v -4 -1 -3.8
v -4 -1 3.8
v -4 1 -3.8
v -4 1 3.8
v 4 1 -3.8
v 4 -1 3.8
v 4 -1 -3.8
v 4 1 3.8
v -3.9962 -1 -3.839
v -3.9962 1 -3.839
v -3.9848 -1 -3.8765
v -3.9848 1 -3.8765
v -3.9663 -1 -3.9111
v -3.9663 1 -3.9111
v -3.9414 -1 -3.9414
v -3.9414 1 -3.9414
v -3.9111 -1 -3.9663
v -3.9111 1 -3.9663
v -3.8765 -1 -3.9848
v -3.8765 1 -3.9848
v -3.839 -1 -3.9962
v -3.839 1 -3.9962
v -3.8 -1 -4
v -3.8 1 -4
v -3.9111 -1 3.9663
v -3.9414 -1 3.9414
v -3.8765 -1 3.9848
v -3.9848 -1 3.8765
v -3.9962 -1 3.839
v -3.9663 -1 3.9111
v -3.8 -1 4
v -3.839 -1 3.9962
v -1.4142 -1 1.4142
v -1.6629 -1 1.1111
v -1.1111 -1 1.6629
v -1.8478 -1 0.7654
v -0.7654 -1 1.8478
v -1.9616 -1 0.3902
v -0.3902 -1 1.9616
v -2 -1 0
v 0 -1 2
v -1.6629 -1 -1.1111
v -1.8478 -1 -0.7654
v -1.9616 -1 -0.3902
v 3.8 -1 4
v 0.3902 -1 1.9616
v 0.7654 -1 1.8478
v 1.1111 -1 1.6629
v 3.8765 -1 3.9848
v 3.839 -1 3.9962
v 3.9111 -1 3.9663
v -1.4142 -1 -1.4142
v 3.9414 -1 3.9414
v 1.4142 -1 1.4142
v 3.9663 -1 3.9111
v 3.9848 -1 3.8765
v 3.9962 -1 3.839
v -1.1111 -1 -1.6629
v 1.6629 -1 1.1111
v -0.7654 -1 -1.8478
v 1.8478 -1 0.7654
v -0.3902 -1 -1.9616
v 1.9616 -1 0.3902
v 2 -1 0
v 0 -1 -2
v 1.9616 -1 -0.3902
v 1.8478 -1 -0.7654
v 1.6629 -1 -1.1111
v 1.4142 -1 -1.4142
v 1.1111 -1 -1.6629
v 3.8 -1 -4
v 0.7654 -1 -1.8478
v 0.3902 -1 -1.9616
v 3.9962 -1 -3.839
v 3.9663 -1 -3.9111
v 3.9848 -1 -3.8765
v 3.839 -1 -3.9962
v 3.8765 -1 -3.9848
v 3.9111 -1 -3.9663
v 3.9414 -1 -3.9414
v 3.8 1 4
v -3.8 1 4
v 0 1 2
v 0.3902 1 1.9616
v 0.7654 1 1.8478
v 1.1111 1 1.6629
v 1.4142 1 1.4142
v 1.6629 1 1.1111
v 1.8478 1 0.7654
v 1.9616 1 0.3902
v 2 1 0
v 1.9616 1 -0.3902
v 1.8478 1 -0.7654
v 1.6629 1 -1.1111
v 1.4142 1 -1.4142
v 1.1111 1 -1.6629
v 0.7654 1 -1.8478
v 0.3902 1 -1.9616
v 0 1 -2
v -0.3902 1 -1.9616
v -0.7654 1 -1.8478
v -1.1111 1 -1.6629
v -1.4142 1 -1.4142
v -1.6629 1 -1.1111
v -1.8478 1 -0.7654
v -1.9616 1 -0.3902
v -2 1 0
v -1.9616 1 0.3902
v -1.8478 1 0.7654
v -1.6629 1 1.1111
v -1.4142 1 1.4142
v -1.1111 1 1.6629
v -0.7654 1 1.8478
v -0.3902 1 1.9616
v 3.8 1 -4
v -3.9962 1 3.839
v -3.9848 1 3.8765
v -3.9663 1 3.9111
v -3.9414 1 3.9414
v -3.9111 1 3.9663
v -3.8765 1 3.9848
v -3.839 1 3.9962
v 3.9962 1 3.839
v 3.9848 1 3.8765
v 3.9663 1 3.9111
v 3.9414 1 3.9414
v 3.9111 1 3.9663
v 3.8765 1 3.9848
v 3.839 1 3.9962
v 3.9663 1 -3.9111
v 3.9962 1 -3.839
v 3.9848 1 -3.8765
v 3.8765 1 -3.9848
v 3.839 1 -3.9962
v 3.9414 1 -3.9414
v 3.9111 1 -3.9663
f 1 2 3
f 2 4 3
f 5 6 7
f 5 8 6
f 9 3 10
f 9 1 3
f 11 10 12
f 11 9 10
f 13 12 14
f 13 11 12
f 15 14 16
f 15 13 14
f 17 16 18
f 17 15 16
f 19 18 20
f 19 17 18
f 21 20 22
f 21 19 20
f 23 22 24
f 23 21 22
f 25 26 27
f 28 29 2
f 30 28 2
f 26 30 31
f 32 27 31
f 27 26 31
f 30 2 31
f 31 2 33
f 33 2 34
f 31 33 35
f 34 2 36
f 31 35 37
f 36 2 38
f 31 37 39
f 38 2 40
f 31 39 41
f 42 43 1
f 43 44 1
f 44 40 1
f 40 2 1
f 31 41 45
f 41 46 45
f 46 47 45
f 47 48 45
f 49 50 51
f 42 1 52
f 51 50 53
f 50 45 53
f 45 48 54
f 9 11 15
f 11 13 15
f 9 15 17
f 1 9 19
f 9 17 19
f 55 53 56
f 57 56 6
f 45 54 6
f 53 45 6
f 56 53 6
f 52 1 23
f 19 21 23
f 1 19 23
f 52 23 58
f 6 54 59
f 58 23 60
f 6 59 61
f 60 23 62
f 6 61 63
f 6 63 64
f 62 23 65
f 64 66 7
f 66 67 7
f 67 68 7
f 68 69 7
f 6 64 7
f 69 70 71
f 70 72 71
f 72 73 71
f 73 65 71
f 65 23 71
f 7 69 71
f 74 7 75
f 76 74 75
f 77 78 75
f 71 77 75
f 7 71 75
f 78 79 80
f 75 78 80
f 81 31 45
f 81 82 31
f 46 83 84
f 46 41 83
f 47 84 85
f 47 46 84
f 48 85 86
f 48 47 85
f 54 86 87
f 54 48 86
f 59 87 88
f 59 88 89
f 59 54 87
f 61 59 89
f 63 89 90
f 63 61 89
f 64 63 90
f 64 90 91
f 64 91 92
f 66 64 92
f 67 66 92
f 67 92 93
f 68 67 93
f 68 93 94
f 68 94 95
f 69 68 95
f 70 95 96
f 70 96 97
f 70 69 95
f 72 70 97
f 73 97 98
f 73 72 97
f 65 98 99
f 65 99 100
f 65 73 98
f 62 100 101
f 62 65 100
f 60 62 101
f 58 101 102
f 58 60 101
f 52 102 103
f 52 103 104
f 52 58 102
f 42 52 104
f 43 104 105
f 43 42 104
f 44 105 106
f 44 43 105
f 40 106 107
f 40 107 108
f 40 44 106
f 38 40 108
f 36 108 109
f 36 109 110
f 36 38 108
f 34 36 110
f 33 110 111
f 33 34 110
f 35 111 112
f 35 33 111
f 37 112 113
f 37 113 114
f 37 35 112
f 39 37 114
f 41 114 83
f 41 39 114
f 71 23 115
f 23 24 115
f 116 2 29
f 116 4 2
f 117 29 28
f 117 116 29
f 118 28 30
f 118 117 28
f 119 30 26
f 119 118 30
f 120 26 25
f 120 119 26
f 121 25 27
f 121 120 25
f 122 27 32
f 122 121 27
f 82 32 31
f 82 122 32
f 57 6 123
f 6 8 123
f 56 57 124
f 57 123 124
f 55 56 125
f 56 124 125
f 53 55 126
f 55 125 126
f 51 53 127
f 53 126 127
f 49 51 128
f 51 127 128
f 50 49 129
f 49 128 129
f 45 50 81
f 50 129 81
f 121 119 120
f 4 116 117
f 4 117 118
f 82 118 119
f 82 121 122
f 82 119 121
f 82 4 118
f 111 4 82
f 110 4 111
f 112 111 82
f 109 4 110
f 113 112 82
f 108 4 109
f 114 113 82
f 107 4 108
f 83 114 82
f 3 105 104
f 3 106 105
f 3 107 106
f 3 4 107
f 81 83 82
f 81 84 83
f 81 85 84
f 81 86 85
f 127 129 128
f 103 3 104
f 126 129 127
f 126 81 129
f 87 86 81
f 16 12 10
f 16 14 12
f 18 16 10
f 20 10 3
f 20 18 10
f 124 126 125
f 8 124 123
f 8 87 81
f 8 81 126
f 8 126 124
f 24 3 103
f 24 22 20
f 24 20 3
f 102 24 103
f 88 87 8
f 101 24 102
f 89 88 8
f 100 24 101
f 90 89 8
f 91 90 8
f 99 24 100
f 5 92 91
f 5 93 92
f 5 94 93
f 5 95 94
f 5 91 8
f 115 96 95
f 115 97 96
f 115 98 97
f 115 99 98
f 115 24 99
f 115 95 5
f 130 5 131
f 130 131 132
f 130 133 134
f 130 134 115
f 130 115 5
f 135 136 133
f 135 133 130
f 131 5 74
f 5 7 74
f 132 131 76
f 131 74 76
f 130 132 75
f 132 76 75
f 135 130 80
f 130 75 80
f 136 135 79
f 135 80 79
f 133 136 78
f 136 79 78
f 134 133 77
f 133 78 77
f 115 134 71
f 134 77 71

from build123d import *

# Parameters (mm, degrees)
SKETCH_1_W      = 8
SKETCH_1_H      = 8
SKETCH_1_R      = 2
EXTRUDE_1_DEPTH = 1
FILLET_1_R      = 0.2


with BuildPart() as part:
    # 草图1 → 凸台-拉伸1 (new, symmetric)
    with BuildSketch(Plane(origin=(0, 0, 0), x_dir=(1, 0, 0), z_dir=(0, 1, 0))):
        Rectangle(SKETCH_1_W, SKETCH_1_H)
        with Locations(Location((0, 0, 0), (0, 0, 270))):
            Circle(SKETCH_1_R, mode=Mode.SUBTRACT)
    extrude(amount=EXTRUDE_1_DEPTH, both=True)

    # 圆角1
    fillet_1_edges = [part.edges().sort_by_distance(p)[0] for p in [
        (4, 0, 4),
        (-4, 0, 4),
        (-4, 0, -4),
        (4, 0, -4),
    ]]
    fillet(fillet_1_edges, radius=FILLET_1_R)


solid = part.part
